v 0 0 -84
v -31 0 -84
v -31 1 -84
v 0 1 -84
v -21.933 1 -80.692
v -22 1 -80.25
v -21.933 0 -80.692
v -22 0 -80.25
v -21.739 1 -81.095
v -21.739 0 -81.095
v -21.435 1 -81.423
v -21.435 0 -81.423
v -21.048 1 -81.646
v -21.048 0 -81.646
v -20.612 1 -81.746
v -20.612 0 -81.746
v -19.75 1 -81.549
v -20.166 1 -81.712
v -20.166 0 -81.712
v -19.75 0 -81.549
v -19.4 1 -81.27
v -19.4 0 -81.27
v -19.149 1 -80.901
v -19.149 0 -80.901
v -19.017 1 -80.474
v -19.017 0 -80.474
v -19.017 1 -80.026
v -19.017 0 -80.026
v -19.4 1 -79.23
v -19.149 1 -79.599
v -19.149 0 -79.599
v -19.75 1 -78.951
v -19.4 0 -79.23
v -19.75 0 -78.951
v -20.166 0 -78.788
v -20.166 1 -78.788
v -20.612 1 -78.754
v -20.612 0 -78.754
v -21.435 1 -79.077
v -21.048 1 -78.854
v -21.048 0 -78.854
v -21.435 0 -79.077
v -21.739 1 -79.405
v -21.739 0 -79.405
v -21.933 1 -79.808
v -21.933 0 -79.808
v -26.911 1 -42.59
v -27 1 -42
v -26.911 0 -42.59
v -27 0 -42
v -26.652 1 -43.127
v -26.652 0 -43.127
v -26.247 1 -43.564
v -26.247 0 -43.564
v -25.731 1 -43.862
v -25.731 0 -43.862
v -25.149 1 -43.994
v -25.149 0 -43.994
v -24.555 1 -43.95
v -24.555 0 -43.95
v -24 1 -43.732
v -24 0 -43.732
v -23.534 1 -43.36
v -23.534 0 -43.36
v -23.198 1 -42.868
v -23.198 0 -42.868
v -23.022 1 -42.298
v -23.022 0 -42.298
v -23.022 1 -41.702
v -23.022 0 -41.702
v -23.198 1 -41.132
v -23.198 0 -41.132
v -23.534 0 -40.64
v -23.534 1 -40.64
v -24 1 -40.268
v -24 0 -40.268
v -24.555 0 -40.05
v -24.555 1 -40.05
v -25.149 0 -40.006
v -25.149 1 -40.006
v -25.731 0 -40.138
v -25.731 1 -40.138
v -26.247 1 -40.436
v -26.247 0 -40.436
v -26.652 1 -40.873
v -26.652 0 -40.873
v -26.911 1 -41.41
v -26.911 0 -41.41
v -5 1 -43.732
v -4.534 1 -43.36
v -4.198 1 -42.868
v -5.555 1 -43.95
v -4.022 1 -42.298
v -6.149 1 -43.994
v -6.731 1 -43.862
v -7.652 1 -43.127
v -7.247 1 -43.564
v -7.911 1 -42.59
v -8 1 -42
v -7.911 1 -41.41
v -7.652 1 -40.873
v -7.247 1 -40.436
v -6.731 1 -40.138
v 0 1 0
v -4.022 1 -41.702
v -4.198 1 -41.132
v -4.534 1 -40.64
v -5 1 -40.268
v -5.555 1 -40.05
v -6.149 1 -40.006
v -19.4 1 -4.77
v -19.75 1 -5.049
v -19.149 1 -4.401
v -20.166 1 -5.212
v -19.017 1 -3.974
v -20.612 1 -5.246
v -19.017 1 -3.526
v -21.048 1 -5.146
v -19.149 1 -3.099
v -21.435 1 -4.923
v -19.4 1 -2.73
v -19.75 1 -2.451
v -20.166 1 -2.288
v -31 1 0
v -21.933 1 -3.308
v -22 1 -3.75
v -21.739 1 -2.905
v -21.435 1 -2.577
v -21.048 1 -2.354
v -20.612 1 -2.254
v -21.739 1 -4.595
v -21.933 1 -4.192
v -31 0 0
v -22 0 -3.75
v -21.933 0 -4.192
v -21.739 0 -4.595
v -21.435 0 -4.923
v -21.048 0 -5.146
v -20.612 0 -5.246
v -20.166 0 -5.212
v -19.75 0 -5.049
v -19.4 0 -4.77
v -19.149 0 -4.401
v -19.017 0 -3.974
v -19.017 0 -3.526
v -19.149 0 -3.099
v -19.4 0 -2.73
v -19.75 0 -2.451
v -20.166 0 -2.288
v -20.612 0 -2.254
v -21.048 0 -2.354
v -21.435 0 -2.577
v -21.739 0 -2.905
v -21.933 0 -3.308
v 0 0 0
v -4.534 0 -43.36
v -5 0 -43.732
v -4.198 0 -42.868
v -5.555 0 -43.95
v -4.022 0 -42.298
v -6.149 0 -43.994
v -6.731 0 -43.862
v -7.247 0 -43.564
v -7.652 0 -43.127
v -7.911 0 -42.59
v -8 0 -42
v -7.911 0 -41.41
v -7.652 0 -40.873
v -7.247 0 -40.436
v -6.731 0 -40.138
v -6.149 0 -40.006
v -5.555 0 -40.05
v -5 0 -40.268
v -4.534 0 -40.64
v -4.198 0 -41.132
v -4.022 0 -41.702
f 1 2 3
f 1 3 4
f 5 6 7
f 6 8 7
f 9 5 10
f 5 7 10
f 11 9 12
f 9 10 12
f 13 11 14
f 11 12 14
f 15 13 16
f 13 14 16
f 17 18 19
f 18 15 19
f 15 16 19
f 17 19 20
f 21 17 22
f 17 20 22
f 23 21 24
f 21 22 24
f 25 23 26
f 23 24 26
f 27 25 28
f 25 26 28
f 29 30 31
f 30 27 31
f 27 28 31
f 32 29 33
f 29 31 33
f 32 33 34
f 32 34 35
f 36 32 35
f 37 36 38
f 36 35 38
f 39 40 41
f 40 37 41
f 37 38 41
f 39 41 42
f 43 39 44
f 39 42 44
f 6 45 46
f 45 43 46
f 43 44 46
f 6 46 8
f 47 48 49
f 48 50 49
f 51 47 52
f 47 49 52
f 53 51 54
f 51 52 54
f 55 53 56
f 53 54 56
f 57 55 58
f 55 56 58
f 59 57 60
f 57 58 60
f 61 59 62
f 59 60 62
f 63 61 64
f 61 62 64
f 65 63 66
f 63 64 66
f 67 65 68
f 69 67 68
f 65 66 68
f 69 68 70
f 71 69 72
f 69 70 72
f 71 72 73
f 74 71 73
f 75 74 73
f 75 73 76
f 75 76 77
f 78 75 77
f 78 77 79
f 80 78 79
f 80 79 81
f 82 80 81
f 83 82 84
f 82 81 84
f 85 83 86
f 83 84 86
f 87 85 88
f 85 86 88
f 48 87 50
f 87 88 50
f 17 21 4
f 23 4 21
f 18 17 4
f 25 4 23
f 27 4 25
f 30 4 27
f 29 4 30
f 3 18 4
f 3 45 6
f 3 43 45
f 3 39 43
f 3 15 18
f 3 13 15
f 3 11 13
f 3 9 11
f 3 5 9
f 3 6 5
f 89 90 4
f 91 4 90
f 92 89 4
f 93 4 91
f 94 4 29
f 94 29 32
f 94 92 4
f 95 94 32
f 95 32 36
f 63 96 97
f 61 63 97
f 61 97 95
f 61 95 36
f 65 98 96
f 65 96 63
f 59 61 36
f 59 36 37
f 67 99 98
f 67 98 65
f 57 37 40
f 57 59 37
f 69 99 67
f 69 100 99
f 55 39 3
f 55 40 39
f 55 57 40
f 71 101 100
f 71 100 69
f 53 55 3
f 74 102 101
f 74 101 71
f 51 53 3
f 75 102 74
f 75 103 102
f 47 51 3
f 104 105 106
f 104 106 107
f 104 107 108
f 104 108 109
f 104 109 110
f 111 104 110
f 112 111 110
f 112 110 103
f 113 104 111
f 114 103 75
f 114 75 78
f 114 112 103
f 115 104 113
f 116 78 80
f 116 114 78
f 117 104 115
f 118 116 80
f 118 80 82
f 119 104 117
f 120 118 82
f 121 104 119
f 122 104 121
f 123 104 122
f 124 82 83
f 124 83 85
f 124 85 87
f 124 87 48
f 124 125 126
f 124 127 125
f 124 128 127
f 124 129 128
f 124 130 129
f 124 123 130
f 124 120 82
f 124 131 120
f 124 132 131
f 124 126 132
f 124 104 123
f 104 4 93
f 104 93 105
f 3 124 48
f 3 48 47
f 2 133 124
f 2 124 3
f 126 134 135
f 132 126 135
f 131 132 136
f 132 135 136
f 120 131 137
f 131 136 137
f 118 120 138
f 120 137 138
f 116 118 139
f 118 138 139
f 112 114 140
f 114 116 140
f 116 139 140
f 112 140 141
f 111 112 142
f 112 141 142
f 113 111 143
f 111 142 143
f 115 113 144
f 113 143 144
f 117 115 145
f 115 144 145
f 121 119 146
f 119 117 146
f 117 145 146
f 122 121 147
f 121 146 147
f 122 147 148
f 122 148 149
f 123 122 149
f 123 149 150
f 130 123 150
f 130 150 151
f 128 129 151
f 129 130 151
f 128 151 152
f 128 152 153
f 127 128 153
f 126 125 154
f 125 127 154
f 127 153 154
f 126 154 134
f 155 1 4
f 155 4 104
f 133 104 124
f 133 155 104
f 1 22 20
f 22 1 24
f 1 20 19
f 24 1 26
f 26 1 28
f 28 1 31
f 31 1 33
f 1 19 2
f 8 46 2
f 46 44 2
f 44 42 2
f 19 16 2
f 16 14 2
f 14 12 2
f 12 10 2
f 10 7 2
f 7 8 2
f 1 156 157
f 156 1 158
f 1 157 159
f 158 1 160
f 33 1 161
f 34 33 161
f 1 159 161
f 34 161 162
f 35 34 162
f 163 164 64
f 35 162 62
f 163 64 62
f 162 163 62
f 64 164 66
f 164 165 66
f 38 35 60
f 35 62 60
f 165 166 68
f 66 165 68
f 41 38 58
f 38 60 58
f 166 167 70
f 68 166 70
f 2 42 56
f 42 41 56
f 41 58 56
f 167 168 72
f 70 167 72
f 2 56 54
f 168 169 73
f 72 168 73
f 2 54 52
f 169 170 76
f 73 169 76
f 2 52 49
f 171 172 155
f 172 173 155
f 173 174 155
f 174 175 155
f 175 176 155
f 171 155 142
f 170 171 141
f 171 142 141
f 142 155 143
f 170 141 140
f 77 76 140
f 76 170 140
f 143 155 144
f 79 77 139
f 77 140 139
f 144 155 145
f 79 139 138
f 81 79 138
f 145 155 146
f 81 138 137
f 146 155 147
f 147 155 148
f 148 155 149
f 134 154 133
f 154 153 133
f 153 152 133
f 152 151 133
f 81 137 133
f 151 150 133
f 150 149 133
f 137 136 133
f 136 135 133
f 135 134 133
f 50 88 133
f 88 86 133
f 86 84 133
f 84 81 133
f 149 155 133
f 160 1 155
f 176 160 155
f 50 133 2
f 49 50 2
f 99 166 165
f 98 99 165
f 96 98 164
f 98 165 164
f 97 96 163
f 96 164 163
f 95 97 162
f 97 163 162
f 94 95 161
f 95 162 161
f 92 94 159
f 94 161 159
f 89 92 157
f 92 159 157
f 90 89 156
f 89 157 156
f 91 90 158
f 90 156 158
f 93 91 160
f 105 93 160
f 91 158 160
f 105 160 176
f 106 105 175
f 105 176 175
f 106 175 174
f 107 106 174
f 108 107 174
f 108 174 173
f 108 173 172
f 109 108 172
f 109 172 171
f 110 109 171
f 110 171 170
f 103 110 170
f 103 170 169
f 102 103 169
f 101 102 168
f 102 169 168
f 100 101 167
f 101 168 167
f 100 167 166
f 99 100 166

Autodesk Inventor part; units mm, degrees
ref_plane "YZ Plane" through (0, 0, 0) normal (1, 0, 0) x (0, 1, 0)
ref_plane "XZ Plane" through (0, 0, 0) normal (0, 1, 0) x (-1, 0, 0)
ref_plane "XY Plane" through (0, 0, 0) normal (0, 0, 1) x (1, 0, 0)
sketch "Sketch1" plane through (0, 0, 0) normal (0, 1, 0) x (-1, 0, 0)
  line L0 (0, 0) -> (31, 0)
  line L1 (31, 0) -> (31, -84)
  line L2 (31, -84) -> (0, -84)
  line L3 (0, -84) -> (0, 0)
  line L4 (31, -42) -> (0, -42)
  circle A0 centre (20.5, -3.75) radius 1.5
  circle A1 centre (20.5, -80.25) radius 1.5
  line L5 (15.5, -84) -> (15.5, 0)
  circle A2 centre (25, -42) radius 2
  circle A3 centre (6, -42) radius 2
  dimension "d0" = 84
  dimension "d1" = 31
  dimension "d3" = 3.75
  dimension "d4" = 10.5
  dimension "d5" = 3
  dimension "d7" = 6
  dimension "d8" = 4
extrude "Extrusion1" add sketch "Sketch1" along normal blind 1 contours L0 L5 L4 A3 L3 | L0 L1 L4 A2 L5 | L4 A3 L5 L2 L3 | L4 A2 L1 L2 L5
properties part number "Platte4"
